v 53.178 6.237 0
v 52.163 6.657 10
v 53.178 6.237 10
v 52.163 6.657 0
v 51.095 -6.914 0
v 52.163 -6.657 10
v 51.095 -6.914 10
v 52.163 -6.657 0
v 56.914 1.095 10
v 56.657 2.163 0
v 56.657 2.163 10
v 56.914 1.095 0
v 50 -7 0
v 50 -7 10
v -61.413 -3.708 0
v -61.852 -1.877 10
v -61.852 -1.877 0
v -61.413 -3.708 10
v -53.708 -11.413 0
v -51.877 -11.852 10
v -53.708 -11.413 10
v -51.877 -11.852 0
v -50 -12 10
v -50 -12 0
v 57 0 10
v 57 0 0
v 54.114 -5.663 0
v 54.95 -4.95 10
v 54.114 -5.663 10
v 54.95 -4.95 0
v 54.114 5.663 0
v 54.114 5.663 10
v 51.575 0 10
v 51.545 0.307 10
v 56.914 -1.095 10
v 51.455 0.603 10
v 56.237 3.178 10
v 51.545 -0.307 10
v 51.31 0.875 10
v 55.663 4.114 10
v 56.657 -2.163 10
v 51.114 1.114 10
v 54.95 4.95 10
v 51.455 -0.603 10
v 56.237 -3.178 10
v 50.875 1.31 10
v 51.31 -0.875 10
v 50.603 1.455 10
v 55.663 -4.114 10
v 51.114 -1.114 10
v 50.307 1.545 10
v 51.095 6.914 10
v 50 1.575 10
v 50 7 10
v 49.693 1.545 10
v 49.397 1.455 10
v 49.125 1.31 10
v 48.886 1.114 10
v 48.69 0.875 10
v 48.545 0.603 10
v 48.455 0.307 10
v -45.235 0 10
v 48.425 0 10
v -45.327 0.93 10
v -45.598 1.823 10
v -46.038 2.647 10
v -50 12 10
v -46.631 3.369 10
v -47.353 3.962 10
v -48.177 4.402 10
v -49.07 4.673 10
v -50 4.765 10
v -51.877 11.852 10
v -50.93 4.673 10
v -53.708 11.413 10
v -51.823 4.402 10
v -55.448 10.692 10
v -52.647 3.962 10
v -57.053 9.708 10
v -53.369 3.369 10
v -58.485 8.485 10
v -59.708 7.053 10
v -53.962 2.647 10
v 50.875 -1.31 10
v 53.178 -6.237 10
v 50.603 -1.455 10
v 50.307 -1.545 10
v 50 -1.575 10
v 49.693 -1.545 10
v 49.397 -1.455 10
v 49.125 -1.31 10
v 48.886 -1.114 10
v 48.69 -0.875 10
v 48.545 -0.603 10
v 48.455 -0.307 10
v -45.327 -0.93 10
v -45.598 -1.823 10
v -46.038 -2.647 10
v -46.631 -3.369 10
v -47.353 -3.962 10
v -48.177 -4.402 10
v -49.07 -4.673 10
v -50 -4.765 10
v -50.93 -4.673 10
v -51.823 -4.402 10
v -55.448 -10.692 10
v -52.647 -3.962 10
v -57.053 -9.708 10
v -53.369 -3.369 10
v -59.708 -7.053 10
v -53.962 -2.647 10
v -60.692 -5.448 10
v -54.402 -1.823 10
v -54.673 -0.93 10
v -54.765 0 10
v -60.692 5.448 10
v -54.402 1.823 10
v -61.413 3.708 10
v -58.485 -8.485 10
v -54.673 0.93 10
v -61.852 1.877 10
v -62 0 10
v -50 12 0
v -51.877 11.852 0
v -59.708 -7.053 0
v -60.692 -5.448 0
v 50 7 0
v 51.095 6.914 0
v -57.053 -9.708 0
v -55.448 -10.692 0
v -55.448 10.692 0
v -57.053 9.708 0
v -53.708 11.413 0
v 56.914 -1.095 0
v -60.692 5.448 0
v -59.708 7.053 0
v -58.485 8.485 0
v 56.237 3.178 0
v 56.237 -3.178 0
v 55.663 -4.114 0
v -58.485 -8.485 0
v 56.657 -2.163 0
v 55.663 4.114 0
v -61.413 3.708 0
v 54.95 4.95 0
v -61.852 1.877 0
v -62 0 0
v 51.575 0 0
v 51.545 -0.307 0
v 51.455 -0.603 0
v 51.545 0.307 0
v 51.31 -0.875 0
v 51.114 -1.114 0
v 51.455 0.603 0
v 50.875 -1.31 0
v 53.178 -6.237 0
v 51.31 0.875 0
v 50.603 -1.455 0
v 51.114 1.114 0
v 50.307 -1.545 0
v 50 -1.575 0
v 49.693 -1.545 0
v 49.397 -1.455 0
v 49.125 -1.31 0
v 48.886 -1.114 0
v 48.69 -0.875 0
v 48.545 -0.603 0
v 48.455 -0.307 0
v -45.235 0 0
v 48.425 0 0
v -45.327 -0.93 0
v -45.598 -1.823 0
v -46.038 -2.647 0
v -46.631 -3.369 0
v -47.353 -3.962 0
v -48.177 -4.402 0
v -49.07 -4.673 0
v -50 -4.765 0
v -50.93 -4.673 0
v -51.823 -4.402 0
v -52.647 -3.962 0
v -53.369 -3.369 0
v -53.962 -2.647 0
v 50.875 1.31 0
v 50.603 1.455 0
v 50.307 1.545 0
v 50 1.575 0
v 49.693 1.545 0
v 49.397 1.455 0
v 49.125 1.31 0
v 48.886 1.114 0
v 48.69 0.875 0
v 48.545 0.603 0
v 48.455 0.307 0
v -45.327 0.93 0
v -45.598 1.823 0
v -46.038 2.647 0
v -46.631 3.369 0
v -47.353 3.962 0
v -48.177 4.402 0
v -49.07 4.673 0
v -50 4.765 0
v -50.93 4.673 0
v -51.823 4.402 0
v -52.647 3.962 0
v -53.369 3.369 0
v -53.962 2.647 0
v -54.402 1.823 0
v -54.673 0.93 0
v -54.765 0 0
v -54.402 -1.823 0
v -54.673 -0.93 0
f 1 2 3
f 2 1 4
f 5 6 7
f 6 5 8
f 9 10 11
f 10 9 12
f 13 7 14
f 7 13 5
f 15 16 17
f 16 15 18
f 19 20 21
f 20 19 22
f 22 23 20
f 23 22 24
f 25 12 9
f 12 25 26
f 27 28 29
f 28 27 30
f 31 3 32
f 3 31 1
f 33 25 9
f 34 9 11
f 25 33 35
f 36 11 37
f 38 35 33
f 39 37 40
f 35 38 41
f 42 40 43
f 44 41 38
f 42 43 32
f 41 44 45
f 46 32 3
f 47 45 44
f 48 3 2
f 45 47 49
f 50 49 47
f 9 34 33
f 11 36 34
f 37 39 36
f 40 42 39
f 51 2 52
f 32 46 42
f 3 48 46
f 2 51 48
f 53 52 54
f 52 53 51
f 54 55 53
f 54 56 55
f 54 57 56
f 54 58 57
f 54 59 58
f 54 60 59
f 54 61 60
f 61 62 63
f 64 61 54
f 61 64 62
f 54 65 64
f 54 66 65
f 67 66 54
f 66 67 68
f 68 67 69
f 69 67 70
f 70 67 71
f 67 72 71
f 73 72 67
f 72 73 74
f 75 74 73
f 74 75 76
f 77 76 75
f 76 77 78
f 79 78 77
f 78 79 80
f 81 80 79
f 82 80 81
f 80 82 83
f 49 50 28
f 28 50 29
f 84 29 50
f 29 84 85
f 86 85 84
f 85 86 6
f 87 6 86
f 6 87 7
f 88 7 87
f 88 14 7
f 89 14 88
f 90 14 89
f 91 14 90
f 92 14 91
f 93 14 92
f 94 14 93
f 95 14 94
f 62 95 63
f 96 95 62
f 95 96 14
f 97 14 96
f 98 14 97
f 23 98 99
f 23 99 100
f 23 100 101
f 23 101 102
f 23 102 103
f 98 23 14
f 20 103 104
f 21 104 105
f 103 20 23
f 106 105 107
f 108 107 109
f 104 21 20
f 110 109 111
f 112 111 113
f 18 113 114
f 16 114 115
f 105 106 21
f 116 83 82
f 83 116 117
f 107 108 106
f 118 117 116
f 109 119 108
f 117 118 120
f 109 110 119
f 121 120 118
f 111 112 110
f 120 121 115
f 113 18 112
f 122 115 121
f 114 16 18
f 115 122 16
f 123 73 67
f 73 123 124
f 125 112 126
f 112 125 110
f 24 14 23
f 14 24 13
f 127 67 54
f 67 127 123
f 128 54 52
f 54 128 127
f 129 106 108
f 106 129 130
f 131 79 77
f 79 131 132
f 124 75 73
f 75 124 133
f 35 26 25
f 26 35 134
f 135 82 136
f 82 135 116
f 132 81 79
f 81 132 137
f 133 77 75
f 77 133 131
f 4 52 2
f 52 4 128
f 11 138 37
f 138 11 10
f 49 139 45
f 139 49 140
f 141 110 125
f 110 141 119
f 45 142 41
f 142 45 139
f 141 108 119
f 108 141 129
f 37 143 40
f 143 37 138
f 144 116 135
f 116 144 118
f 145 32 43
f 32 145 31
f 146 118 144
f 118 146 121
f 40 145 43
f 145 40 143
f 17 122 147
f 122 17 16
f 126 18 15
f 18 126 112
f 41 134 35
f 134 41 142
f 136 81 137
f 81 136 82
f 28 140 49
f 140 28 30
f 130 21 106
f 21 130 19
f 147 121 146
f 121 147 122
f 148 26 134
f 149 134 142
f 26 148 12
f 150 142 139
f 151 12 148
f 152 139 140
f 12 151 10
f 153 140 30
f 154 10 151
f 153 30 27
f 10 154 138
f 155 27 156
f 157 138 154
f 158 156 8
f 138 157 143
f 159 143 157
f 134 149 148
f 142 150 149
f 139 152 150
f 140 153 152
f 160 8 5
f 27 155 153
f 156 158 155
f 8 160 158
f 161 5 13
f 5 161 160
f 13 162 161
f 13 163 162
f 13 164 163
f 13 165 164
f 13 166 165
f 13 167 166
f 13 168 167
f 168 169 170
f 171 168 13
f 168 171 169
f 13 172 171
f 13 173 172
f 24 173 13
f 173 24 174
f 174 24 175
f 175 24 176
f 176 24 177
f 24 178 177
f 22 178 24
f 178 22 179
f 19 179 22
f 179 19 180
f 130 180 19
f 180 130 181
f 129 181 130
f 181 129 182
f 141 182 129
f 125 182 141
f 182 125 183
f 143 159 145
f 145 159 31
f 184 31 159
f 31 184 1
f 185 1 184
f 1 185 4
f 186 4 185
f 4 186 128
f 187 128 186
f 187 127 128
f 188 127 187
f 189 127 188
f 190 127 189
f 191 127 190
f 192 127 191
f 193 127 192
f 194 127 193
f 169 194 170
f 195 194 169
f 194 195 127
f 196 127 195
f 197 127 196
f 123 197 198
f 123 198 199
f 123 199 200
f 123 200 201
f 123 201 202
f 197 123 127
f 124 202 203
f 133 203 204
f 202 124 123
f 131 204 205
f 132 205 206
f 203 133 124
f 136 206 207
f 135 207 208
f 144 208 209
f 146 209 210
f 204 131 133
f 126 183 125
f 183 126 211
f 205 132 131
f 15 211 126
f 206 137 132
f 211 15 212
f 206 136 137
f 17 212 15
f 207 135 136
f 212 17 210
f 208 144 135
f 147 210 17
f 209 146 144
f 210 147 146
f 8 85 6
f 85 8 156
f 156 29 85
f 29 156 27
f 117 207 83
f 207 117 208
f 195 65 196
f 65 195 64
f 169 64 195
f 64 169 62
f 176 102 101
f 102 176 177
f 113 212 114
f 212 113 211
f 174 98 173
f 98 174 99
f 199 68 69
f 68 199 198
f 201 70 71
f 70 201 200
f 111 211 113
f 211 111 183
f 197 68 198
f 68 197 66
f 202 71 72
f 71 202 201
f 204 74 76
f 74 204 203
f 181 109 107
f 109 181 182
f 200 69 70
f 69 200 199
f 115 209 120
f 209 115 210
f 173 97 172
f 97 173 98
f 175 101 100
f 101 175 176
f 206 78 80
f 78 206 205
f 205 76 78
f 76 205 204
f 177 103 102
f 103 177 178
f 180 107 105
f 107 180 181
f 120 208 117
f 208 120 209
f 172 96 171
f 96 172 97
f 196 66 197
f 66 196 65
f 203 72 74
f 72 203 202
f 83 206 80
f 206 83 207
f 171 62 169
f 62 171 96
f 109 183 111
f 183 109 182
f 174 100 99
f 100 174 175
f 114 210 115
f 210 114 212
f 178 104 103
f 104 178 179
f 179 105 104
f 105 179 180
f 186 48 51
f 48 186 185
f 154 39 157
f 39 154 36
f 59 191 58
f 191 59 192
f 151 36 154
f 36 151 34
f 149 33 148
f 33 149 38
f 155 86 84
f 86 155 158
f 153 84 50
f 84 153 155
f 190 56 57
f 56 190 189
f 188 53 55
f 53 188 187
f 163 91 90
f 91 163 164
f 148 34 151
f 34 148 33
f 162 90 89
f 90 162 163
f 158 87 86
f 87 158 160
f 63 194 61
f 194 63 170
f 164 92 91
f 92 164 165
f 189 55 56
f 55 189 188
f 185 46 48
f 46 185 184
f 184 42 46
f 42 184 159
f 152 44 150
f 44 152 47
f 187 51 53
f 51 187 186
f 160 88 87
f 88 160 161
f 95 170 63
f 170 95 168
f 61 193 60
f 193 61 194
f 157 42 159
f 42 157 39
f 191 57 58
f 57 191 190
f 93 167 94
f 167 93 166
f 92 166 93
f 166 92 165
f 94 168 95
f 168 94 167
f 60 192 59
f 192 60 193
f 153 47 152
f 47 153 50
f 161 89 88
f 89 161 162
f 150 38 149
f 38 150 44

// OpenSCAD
$fn = 32;

// ----------------------------------------------------------------------
// Lever: 100 mm between the bosses, 10 mm thick, smooth outline
// ----------------------------------------------------------------------

// --- parameters (mm) ---
lever_l = 100;            // distance between the boss centres
boss_a = 24;              // first boss diameter
boss_b = 14;              // second boss diameter
bore_a = 9.53;            // first bore
bore_b = 3.15;            // second bore
lever_t = 10;             // lever thickness

lever_profile = [[-62, 0], [-61.852, -1.877], [-61.413, -3.708], [-60.692, -5.448], [-59.708, -7.053], [-58.485, -8.485], [-57.053, -9.708], [-55.448, -10.692], [-53.708, -11.413], [-51.877, -11.852], [-50, -12], [50, -7], [51.095, -6.914], [52.163, -6.657], [53.178, -6.237], [54.114, -5.663], [54.95, -4.95], [55.663, -4.114], [56.237, -3.178], [56.657, -2.163], [56.914, -1.095], [57, 0], [56.914, 1.095], [56.657, 2.163], [56.237, 3.178], [55.663, 4.114], [54.95, 4.95], [54.114, 5.663], [53.178, 6.237], [52.163, 6.657], [51.095, 6.914], [50, 7], [-50, 12], [-51.877, 11.852], [-53.708, 11.413], [-55.448, 10.692], [-57.053, 9.708], [-58.485, 8.485], [-59.708, 7.053], [-60.692, 5.448], [-61.413, 3.708], [-61.852, 1.877]];

difference() {
  linear_extrude(height = lever_t) polygon(lever_profile);
  translate([-50, 0, -2.5]) cylinder(h = lever_t + 5, d = bore_a);
  translate([50, 0, -2.5]) cylinder(h = lever_t + 5, d = bore_b);
}
